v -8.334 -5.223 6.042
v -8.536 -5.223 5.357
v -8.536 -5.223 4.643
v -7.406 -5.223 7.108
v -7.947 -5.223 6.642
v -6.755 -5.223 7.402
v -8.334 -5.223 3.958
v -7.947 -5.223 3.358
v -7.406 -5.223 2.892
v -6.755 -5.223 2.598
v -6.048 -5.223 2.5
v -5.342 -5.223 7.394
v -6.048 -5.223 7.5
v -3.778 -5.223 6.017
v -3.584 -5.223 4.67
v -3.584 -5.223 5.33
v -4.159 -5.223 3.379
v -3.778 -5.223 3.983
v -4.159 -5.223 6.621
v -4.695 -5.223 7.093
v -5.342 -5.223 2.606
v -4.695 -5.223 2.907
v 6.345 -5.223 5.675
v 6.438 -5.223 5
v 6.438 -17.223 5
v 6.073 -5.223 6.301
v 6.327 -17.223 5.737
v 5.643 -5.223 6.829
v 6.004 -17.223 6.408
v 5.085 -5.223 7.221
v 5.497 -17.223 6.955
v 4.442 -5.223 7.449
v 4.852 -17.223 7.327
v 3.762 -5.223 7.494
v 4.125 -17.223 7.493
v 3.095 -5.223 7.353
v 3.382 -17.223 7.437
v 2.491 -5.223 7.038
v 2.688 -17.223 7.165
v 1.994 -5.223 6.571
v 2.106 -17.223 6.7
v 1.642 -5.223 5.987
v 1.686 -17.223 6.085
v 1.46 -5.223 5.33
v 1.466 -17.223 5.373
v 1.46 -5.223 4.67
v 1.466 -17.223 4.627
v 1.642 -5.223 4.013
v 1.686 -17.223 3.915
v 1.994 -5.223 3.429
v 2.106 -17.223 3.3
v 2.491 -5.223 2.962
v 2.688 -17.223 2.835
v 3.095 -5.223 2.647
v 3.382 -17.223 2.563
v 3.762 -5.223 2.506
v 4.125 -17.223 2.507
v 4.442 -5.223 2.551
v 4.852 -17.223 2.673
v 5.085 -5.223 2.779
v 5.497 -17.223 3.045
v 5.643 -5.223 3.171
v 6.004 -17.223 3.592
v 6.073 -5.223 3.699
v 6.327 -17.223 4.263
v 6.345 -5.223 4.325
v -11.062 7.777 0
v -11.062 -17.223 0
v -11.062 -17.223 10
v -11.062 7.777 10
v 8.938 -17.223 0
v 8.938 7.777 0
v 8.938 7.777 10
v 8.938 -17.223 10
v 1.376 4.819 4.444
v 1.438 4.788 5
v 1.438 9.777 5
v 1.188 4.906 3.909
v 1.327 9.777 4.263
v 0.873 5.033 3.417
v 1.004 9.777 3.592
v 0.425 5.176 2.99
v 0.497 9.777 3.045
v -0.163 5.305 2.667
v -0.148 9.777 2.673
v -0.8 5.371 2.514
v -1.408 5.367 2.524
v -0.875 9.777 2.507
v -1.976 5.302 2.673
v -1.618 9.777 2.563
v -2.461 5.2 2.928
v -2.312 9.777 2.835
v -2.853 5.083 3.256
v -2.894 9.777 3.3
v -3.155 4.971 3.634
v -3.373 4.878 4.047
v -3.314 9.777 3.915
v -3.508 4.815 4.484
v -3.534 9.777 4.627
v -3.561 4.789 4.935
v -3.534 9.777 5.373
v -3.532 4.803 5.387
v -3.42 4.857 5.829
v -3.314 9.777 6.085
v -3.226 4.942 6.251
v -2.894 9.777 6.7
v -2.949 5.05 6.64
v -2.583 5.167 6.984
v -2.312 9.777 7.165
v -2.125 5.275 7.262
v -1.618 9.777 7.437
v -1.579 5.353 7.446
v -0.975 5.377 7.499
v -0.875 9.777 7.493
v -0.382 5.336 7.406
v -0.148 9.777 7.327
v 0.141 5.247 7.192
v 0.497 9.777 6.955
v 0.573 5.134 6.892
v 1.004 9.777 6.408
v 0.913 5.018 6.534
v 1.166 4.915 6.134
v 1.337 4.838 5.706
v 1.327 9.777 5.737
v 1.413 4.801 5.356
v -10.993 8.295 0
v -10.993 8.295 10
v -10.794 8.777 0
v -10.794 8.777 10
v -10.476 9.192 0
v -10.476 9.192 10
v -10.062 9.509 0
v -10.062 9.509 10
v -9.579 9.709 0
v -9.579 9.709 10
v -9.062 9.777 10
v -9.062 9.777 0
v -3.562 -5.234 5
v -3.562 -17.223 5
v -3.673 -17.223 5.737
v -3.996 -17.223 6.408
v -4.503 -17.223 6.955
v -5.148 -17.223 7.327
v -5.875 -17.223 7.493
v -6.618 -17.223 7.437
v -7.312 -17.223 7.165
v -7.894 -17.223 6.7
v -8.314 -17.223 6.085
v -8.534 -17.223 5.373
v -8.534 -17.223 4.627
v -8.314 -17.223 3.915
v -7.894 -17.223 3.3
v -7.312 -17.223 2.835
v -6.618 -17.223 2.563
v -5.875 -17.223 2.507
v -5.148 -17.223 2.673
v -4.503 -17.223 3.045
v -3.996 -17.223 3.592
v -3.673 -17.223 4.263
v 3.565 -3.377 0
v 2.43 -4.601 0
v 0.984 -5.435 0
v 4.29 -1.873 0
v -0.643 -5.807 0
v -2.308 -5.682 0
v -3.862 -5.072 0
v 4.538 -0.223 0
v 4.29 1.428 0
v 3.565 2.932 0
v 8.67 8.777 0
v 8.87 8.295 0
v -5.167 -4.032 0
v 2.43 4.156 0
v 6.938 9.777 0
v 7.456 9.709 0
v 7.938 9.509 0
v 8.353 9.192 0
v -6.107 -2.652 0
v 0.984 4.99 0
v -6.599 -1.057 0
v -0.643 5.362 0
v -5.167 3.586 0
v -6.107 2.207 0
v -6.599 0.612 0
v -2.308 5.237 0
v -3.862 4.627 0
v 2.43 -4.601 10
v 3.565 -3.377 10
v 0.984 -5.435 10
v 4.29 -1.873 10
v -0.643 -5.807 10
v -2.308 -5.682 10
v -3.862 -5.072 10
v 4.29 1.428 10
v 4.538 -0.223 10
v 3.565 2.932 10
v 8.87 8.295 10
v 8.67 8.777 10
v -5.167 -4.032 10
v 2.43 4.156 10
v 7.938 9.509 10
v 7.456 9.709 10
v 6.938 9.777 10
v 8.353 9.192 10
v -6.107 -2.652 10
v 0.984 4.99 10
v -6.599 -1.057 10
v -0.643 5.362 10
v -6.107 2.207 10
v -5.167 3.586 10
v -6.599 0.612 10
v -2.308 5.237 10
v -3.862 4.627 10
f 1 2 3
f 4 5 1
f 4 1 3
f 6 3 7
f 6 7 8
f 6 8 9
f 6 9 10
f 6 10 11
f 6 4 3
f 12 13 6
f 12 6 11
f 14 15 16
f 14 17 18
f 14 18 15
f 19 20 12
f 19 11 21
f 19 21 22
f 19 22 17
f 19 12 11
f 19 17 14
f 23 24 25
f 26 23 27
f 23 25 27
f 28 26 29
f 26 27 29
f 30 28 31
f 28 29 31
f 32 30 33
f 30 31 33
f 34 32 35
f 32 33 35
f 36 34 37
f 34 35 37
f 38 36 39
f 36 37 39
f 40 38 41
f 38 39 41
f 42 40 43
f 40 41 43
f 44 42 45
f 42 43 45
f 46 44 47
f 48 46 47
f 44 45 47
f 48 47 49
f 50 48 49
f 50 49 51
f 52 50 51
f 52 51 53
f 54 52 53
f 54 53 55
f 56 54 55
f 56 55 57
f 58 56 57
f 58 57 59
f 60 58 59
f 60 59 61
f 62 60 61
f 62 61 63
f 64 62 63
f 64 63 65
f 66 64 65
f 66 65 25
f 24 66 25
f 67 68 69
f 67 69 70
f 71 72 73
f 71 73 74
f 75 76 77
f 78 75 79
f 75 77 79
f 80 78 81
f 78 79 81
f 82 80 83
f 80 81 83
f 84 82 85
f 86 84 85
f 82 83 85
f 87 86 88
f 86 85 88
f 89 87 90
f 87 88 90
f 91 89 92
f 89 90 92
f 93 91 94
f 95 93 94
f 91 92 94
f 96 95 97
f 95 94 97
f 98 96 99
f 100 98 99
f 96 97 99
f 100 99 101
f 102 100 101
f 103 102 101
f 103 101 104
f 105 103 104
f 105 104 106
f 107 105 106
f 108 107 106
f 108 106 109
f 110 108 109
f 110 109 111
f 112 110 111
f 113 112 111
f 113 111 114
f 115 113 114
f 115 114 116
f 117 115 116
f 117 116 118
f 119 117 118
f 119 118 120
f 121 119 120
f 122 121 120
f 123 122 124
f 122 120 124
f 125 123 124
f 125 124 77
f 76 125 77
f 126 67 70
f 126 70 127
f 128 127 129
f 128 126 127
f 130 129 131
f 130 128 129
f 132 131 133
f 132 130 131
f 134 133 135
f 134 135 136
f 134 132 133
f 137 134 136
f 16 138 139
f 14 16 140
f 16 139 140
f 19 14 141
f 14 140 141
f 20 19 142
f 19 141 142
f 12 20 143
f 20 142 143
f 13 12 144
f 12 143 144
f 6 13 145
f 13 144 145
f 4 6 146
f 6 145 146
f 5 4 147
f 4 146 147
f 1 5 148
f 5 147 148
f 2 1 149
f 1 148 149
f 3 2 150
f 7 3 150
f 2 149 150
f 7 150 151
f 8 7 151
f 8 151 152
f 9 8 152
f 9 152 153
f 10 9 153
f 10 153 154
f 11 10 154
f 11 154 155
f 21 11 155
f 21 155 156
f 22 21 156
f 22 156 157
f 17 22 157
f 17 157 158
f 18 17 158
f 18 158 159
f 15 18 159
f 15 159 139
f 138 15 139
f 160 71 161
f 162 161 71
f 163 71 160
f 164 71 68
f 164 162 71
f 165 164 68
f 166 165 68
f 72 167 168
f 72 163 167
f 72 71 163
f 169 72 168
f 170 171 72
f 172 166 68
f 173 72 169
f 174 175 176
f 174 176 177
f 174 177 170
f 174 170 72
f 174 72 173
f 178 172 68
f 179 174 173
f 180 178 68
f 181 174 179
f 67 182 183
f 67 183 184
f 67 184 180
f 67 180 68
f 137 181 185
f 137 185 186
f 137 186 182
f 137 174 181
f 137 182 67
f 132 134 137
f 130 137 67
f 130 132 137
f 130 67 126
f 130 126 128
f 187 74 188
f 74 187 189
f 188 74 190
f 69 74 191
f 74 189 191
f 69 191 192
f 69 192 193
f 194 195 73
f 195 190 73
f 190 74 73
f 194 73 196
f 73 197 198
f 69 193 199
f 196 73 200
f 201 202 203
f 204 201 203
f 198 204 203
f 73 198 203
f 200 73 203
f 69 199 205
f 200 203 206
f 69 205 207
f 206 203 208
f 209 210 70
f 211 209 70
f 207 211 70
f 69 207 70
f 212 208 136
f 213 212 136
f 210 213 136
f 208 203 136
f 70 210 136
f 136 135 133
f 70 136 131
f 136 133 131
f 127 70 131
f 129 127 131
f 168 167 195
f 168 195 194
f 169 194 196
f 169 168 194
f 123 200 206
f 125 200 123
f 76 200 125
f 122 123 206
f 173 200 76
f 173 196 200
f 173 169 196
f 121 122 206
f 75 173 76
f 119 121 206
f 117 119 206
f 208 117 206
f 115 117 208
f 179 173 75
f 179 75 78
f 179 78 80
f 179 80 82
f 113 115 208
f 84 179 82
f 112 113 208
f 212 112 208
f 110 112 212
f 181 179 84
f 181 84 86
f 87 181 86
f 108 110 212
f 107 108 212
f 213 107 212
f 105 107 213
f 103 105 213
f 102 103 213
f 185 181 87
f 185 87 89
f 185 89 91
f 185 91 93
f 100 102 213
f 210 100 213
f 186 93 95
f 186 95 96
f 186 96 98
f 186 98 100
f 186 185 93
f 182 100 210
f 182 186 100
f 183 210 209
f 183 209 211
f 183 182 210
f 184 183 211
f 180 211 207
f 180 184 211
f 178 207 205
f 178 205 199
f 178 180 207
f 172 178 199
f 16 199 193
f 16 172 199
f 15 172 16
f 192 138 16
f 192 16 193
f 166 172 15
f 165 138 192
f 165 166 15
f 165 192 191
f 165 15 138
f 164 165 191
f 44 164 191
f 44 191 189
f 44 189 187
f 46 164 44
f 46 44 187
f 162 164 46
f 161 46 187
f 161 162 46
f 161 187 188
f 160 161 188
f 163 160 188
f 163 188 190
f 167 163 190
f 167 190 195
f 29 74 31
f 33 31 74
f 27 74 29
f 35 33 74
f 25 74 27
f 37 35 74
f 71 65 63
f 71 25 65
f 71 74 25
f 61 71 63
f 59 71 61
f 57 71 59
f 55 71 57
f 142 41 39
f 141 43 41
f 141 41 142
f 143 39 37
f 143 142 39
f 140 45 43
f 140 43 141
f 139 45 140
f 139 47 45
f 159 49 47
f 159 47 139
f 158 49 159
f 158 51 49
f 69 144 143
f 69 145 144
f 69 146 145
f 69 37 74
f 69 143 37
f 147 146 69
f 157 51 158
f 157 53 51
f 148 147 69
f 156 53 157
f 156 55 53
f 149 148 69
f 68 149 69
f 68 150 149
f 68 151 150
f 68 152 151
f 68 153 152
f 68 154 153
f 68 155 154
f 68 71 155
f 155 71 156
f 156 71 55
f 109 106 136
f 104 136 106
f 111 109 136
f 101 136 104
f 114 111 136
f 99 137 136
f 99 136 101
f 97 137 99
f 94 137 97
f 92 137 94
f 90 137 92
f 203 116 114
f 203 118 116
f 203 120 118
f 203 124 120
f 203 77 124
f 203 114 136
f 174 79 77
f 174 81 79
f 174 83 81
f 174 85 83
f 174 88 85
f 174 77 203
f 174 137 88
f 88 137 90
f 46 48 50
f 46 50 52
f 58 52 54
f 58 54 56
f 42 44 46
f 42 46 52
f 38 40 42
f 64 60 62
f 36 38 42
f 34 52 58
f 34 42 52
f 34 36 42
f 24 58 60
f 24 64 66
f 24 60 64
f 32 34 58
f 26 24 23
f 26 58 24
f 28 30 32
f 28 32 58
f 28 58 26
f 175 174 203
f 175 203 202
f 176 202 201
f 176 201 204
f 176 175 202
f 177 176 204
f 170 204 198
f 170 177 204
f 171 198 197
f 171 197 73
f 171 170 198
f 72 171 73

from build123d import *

# Parameters (mm, degrees)
SKETCH_1_R          = 5.6
EXTRUDE_1_DEPTH     = 10
SKETCH_9_R          = 2.5
CUT_EXTRUDE_1_DEPTH = 6
SKETCH_11_R         = 2.5
CUT_EXTRUDE_2_DEPTH = 12


with BuildPart() as part:
    # 草图1 → 凸台-拉伸1 (new body)
    with BuildSketch(Plane.XY):
        with BuildLine():
            Line((-9.061643836, 9.77739726), (6.938356164, 9.77739726))
            ThreePointArc((6.938356164, 9.77739726), (8.352569727, 9.191610823), (8.938356164, 7.77739726))
            Line((8.938356164, 7.77739726), (8.938356164, -17.22260274))
            Line((8.938356164, -17.22260274), (-11.061643836, -17.22260274))
            Line((-11.061643836, -17.22260274), (-11.061643836, 7.77739726))
            ThreePointArc((-11.061643836, 7.77739726), (-10.475857398, 9.191610823), (-9.061643836, 9.77739726))
        make_face()
        with Locations((-1.061643836, -0.22260274)):
            Circle(SKETCH_1_R, mode=Mode.SUBTRACT)
    extrude(amount=EXTRUDE_1_DEPTH)

    # 草图9 → 切除-拉伸1 (cut)
    with BuildSketch(Plane(origin=(0, 9.77739726, 0), x_dir=(1, 0, 0), z_dir=(0, 1, 0))):
        with Locations((-1.061643836, -5)):
            Circle(SKETCH_9_R)
    extrude(amount=-CUT_EXTRUDE_1_DEPTH, mode=Mode.SUBTRACT)

    # 草图11 → 切除-拉伸2 (cut)
    with BuildSketch(Plane.XZ.offset(17.22260274)):
        with Locations((-6.061643836, 5)):
            Circle(SKETCH_11_R)
        with Locations((3.938356164, 5)):
            Circle(SKETCH_11_R)
    extrude(amount=-CUT_EXTRUDE_2_DEPTH, mode=Mode.SUBTRACT)


solid = part.part
